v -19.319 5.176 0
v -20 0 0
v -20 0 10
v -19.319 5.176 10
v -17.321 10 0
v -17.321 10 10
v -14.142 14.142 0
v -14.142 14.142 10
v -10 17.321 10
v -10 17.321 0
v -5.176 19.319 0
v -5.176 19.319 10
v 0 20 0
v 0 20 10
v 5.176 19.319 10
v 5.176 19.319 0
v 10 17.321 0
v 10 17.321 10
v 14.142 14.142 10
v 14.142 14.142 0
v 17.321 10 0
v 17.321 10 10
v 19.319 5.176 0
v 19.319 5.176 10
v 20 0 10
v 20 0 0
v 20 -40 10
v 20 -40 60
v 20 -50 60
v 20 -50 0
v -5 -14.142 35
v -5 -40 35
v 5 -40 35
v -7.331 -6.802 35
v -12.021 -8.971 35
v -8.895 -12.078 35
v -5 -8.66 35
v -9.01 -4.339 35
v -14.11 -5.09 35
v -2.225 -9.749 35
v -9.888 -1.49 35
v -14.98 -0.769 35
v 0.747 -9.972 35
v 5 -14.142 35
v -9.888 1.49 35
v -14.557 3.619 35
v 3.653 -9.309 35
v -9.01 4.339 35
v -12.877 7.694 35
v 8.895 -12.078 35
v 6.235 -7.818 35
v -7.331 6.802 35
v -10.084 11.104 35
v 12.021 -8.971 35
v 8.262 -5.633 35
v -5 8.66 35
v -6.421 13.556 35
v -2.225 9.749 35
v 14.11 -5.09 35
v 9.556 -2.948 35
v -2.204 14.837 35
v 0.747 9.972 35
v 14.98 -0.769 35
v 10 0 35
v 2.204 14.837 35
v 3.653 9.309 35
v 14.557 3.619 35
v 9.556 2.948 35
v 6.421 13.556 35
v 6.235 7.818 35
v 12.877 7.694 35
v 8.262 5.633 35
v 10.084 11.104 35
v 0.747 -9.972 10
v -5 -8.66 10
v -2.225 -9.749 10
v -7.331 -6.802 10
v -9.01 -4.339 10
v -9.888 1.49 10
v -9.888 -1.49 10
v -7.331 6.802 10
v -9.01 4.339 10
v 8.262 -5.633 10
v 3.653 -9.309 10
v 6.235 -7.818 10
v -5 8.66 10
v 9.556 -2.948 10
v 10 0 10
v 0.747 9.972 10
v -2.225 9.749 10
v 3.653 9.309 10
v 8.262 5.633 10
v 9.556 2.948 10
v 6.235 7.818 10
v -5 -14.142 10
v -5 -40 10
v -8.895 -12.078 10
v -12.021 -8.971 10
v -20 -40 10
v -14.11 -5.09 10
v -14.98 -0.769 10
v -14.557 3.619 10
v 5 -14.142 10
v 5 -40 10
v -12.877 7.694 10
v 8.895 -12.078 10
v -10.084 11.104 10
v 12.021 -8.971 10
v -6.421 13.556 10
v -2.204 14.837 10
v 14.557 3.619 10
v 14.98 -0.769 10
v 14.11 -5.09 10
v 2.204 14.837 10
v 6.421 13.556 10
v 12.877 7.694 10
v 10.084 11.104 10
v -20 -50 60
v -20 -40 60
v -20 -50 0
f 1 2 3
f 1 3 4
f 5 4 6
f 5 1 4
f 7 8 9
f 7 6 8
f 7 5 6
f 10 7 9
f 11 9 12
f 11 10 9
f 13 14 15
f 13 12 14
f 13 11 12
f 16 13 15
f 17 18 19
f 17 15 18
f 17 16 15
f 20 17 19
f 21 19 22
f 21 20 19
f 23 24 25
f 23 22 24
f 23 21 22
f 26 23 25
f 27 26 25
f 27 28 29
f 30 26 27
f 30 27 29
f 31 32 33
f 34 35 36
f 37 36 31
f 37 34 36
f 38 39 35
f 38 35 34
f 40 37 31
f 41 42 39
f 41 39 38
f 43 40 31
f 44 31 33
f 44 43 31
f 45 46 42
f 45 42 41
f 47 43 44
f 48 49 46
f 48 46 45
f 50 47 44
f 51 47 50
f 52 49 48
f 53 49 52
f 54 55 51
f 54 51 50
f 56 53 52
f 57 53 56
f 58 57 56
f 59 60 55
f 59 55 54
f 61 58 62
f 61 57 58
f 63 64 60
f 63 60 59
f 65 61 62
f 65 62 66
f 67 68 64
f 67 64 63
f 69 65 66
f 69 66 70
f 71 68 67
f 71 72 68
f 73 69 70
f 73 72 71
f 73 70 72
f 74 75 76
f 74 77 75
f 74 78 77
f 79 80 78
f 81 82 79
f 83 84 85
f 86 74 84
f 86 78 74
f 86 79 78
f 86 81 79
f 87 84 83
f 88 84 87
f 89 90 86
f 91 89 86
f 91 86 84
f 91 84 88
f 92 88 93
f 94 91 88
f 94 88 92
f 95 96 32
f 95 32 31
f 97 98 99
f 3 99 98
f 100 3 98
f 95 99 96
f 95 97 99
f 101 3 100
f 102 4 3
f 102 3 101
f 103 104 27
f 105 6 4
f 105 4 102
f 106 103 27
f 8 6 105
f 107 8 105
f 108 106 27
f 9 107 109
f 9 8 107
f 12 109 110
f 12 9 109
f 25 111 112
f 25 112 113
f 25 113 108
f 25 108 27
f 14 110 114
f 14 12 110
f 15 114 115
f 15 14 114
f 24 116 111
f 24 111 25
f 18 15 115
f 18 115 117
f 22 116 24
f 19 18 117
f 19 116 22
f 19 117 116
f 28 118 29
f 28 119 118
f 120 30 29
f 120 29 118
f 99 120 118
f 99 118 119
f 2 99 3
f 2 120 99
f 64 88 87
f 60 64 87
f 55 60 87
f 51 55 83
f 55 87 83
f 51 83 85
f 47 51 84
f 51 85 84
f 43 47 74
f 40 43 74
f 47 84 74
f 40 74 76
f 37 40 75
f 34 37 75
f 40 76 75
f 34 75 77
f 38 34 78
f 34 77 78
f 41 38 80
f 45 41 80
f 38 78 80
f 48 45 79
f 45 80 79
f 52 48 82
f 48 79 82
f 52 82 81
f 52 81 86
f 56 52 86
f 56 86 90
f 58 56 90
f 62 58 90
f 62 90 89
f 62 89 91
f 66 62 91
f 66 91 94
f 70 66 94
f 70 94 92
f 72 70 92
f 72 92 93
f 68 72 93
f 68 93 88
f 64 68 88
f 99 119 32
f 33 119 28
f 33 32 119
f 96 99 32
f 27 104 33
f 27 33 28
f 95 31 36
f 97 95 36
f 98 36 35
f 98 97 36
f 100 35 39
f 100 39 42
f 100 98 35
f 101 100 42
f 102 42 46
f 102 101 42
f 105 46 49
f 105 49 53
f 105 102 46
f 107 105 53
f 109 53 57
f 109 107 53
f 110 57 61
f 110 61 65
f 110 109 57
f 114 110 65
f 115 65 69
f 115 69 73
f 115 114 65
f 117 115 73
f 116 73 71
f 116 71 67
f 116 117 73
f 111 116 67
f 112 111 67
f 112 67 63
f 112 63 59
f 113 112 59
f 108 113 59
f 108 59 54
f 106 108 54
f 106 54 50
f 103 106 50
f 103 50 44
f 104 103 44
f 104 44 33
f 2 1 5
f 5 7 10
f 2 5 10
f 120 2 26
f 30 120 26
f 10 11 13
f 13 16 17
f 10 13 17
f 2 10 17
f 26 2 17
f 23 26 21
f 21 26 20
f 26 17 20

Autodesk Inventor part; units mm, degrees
ref_plane "YZ Plane" through (0, 0, 0) normal (1, 0, 0) x (0, 1, 0)
ref_plane "XZ Plane" through (0, 0, 0) normal (0, 1, 0) x (-1, 0, 0)
ref_plane "XY Plane" through (0, 0, 0) normal (0, 0, 1) x (1, 0, 0)
sketch "Sketch1" plane through (0, 0, 0) normal (0, 0, 1) x (1, 0, 0)
  circle A0 centre (0, 0) radius 10
  circle A1 centre (0, 0) radius 15
  circle A2 centre (0, 0) radius 20
  line L0 (-20, 0) -> (20, 0)
  line L1 (20, 0) -> (20, -50)
  line L2 (20, -50) -> (-20, -50)
  line L3 (-20, -50) -> (-20, 0)
  line L4 (-20, -40) -> (20, -40)
  line L5 (20, -40) -> (20, -50)
  line L6 (20, -50) -> (-20, -50)
  line L7 (-20, -50) -> (-20, -40)
  line L8 (-5, -13) -> (5, -13)
  line L9 (5, -13) -> (5, -40)
  line L10 (5, -40) -> (-5, -40)
  line L11 (-5, -40) -> (-5, -13)
  point P0 (0, -50)
  point P1 (0, -40)
  dimension "d0" = 20
  dimension "d1" = 30
  dimension "d2" = 40
  dimension "d3" = 40
  dimension "d4" = 50
  dimension "d5" = 40
  dimension "d6" = 10
  dimension "d7" = 10
  dimension "d8" = 27
extrude "Extrusion1" add sketch "Sketch1" along normal blind 35 contours L0 A1 L9 L8 L11 A0 | A0 L0 A1 | L9 A2 L11 A1 | A1 L11 L8 L9 | L9 L4 L11 A2
extrude "Extrusion2" add sketch "Sketch1" along normal blind 10 contours L0 A0 | L0 A1 L9 L8 L11 A0 | A0 L0 | L0 A2 L9 A1 | A1 L0 A2 | A1 L11 A2 L0 | L9 A2 L11 A1 | L1 L4 L9 A2 | A2 L11 L4 L3
extrude "Extrusion3" add sketch "Sketch1" along normal blind 60 contours L1 L2 L3 L4
properties part number "A"
